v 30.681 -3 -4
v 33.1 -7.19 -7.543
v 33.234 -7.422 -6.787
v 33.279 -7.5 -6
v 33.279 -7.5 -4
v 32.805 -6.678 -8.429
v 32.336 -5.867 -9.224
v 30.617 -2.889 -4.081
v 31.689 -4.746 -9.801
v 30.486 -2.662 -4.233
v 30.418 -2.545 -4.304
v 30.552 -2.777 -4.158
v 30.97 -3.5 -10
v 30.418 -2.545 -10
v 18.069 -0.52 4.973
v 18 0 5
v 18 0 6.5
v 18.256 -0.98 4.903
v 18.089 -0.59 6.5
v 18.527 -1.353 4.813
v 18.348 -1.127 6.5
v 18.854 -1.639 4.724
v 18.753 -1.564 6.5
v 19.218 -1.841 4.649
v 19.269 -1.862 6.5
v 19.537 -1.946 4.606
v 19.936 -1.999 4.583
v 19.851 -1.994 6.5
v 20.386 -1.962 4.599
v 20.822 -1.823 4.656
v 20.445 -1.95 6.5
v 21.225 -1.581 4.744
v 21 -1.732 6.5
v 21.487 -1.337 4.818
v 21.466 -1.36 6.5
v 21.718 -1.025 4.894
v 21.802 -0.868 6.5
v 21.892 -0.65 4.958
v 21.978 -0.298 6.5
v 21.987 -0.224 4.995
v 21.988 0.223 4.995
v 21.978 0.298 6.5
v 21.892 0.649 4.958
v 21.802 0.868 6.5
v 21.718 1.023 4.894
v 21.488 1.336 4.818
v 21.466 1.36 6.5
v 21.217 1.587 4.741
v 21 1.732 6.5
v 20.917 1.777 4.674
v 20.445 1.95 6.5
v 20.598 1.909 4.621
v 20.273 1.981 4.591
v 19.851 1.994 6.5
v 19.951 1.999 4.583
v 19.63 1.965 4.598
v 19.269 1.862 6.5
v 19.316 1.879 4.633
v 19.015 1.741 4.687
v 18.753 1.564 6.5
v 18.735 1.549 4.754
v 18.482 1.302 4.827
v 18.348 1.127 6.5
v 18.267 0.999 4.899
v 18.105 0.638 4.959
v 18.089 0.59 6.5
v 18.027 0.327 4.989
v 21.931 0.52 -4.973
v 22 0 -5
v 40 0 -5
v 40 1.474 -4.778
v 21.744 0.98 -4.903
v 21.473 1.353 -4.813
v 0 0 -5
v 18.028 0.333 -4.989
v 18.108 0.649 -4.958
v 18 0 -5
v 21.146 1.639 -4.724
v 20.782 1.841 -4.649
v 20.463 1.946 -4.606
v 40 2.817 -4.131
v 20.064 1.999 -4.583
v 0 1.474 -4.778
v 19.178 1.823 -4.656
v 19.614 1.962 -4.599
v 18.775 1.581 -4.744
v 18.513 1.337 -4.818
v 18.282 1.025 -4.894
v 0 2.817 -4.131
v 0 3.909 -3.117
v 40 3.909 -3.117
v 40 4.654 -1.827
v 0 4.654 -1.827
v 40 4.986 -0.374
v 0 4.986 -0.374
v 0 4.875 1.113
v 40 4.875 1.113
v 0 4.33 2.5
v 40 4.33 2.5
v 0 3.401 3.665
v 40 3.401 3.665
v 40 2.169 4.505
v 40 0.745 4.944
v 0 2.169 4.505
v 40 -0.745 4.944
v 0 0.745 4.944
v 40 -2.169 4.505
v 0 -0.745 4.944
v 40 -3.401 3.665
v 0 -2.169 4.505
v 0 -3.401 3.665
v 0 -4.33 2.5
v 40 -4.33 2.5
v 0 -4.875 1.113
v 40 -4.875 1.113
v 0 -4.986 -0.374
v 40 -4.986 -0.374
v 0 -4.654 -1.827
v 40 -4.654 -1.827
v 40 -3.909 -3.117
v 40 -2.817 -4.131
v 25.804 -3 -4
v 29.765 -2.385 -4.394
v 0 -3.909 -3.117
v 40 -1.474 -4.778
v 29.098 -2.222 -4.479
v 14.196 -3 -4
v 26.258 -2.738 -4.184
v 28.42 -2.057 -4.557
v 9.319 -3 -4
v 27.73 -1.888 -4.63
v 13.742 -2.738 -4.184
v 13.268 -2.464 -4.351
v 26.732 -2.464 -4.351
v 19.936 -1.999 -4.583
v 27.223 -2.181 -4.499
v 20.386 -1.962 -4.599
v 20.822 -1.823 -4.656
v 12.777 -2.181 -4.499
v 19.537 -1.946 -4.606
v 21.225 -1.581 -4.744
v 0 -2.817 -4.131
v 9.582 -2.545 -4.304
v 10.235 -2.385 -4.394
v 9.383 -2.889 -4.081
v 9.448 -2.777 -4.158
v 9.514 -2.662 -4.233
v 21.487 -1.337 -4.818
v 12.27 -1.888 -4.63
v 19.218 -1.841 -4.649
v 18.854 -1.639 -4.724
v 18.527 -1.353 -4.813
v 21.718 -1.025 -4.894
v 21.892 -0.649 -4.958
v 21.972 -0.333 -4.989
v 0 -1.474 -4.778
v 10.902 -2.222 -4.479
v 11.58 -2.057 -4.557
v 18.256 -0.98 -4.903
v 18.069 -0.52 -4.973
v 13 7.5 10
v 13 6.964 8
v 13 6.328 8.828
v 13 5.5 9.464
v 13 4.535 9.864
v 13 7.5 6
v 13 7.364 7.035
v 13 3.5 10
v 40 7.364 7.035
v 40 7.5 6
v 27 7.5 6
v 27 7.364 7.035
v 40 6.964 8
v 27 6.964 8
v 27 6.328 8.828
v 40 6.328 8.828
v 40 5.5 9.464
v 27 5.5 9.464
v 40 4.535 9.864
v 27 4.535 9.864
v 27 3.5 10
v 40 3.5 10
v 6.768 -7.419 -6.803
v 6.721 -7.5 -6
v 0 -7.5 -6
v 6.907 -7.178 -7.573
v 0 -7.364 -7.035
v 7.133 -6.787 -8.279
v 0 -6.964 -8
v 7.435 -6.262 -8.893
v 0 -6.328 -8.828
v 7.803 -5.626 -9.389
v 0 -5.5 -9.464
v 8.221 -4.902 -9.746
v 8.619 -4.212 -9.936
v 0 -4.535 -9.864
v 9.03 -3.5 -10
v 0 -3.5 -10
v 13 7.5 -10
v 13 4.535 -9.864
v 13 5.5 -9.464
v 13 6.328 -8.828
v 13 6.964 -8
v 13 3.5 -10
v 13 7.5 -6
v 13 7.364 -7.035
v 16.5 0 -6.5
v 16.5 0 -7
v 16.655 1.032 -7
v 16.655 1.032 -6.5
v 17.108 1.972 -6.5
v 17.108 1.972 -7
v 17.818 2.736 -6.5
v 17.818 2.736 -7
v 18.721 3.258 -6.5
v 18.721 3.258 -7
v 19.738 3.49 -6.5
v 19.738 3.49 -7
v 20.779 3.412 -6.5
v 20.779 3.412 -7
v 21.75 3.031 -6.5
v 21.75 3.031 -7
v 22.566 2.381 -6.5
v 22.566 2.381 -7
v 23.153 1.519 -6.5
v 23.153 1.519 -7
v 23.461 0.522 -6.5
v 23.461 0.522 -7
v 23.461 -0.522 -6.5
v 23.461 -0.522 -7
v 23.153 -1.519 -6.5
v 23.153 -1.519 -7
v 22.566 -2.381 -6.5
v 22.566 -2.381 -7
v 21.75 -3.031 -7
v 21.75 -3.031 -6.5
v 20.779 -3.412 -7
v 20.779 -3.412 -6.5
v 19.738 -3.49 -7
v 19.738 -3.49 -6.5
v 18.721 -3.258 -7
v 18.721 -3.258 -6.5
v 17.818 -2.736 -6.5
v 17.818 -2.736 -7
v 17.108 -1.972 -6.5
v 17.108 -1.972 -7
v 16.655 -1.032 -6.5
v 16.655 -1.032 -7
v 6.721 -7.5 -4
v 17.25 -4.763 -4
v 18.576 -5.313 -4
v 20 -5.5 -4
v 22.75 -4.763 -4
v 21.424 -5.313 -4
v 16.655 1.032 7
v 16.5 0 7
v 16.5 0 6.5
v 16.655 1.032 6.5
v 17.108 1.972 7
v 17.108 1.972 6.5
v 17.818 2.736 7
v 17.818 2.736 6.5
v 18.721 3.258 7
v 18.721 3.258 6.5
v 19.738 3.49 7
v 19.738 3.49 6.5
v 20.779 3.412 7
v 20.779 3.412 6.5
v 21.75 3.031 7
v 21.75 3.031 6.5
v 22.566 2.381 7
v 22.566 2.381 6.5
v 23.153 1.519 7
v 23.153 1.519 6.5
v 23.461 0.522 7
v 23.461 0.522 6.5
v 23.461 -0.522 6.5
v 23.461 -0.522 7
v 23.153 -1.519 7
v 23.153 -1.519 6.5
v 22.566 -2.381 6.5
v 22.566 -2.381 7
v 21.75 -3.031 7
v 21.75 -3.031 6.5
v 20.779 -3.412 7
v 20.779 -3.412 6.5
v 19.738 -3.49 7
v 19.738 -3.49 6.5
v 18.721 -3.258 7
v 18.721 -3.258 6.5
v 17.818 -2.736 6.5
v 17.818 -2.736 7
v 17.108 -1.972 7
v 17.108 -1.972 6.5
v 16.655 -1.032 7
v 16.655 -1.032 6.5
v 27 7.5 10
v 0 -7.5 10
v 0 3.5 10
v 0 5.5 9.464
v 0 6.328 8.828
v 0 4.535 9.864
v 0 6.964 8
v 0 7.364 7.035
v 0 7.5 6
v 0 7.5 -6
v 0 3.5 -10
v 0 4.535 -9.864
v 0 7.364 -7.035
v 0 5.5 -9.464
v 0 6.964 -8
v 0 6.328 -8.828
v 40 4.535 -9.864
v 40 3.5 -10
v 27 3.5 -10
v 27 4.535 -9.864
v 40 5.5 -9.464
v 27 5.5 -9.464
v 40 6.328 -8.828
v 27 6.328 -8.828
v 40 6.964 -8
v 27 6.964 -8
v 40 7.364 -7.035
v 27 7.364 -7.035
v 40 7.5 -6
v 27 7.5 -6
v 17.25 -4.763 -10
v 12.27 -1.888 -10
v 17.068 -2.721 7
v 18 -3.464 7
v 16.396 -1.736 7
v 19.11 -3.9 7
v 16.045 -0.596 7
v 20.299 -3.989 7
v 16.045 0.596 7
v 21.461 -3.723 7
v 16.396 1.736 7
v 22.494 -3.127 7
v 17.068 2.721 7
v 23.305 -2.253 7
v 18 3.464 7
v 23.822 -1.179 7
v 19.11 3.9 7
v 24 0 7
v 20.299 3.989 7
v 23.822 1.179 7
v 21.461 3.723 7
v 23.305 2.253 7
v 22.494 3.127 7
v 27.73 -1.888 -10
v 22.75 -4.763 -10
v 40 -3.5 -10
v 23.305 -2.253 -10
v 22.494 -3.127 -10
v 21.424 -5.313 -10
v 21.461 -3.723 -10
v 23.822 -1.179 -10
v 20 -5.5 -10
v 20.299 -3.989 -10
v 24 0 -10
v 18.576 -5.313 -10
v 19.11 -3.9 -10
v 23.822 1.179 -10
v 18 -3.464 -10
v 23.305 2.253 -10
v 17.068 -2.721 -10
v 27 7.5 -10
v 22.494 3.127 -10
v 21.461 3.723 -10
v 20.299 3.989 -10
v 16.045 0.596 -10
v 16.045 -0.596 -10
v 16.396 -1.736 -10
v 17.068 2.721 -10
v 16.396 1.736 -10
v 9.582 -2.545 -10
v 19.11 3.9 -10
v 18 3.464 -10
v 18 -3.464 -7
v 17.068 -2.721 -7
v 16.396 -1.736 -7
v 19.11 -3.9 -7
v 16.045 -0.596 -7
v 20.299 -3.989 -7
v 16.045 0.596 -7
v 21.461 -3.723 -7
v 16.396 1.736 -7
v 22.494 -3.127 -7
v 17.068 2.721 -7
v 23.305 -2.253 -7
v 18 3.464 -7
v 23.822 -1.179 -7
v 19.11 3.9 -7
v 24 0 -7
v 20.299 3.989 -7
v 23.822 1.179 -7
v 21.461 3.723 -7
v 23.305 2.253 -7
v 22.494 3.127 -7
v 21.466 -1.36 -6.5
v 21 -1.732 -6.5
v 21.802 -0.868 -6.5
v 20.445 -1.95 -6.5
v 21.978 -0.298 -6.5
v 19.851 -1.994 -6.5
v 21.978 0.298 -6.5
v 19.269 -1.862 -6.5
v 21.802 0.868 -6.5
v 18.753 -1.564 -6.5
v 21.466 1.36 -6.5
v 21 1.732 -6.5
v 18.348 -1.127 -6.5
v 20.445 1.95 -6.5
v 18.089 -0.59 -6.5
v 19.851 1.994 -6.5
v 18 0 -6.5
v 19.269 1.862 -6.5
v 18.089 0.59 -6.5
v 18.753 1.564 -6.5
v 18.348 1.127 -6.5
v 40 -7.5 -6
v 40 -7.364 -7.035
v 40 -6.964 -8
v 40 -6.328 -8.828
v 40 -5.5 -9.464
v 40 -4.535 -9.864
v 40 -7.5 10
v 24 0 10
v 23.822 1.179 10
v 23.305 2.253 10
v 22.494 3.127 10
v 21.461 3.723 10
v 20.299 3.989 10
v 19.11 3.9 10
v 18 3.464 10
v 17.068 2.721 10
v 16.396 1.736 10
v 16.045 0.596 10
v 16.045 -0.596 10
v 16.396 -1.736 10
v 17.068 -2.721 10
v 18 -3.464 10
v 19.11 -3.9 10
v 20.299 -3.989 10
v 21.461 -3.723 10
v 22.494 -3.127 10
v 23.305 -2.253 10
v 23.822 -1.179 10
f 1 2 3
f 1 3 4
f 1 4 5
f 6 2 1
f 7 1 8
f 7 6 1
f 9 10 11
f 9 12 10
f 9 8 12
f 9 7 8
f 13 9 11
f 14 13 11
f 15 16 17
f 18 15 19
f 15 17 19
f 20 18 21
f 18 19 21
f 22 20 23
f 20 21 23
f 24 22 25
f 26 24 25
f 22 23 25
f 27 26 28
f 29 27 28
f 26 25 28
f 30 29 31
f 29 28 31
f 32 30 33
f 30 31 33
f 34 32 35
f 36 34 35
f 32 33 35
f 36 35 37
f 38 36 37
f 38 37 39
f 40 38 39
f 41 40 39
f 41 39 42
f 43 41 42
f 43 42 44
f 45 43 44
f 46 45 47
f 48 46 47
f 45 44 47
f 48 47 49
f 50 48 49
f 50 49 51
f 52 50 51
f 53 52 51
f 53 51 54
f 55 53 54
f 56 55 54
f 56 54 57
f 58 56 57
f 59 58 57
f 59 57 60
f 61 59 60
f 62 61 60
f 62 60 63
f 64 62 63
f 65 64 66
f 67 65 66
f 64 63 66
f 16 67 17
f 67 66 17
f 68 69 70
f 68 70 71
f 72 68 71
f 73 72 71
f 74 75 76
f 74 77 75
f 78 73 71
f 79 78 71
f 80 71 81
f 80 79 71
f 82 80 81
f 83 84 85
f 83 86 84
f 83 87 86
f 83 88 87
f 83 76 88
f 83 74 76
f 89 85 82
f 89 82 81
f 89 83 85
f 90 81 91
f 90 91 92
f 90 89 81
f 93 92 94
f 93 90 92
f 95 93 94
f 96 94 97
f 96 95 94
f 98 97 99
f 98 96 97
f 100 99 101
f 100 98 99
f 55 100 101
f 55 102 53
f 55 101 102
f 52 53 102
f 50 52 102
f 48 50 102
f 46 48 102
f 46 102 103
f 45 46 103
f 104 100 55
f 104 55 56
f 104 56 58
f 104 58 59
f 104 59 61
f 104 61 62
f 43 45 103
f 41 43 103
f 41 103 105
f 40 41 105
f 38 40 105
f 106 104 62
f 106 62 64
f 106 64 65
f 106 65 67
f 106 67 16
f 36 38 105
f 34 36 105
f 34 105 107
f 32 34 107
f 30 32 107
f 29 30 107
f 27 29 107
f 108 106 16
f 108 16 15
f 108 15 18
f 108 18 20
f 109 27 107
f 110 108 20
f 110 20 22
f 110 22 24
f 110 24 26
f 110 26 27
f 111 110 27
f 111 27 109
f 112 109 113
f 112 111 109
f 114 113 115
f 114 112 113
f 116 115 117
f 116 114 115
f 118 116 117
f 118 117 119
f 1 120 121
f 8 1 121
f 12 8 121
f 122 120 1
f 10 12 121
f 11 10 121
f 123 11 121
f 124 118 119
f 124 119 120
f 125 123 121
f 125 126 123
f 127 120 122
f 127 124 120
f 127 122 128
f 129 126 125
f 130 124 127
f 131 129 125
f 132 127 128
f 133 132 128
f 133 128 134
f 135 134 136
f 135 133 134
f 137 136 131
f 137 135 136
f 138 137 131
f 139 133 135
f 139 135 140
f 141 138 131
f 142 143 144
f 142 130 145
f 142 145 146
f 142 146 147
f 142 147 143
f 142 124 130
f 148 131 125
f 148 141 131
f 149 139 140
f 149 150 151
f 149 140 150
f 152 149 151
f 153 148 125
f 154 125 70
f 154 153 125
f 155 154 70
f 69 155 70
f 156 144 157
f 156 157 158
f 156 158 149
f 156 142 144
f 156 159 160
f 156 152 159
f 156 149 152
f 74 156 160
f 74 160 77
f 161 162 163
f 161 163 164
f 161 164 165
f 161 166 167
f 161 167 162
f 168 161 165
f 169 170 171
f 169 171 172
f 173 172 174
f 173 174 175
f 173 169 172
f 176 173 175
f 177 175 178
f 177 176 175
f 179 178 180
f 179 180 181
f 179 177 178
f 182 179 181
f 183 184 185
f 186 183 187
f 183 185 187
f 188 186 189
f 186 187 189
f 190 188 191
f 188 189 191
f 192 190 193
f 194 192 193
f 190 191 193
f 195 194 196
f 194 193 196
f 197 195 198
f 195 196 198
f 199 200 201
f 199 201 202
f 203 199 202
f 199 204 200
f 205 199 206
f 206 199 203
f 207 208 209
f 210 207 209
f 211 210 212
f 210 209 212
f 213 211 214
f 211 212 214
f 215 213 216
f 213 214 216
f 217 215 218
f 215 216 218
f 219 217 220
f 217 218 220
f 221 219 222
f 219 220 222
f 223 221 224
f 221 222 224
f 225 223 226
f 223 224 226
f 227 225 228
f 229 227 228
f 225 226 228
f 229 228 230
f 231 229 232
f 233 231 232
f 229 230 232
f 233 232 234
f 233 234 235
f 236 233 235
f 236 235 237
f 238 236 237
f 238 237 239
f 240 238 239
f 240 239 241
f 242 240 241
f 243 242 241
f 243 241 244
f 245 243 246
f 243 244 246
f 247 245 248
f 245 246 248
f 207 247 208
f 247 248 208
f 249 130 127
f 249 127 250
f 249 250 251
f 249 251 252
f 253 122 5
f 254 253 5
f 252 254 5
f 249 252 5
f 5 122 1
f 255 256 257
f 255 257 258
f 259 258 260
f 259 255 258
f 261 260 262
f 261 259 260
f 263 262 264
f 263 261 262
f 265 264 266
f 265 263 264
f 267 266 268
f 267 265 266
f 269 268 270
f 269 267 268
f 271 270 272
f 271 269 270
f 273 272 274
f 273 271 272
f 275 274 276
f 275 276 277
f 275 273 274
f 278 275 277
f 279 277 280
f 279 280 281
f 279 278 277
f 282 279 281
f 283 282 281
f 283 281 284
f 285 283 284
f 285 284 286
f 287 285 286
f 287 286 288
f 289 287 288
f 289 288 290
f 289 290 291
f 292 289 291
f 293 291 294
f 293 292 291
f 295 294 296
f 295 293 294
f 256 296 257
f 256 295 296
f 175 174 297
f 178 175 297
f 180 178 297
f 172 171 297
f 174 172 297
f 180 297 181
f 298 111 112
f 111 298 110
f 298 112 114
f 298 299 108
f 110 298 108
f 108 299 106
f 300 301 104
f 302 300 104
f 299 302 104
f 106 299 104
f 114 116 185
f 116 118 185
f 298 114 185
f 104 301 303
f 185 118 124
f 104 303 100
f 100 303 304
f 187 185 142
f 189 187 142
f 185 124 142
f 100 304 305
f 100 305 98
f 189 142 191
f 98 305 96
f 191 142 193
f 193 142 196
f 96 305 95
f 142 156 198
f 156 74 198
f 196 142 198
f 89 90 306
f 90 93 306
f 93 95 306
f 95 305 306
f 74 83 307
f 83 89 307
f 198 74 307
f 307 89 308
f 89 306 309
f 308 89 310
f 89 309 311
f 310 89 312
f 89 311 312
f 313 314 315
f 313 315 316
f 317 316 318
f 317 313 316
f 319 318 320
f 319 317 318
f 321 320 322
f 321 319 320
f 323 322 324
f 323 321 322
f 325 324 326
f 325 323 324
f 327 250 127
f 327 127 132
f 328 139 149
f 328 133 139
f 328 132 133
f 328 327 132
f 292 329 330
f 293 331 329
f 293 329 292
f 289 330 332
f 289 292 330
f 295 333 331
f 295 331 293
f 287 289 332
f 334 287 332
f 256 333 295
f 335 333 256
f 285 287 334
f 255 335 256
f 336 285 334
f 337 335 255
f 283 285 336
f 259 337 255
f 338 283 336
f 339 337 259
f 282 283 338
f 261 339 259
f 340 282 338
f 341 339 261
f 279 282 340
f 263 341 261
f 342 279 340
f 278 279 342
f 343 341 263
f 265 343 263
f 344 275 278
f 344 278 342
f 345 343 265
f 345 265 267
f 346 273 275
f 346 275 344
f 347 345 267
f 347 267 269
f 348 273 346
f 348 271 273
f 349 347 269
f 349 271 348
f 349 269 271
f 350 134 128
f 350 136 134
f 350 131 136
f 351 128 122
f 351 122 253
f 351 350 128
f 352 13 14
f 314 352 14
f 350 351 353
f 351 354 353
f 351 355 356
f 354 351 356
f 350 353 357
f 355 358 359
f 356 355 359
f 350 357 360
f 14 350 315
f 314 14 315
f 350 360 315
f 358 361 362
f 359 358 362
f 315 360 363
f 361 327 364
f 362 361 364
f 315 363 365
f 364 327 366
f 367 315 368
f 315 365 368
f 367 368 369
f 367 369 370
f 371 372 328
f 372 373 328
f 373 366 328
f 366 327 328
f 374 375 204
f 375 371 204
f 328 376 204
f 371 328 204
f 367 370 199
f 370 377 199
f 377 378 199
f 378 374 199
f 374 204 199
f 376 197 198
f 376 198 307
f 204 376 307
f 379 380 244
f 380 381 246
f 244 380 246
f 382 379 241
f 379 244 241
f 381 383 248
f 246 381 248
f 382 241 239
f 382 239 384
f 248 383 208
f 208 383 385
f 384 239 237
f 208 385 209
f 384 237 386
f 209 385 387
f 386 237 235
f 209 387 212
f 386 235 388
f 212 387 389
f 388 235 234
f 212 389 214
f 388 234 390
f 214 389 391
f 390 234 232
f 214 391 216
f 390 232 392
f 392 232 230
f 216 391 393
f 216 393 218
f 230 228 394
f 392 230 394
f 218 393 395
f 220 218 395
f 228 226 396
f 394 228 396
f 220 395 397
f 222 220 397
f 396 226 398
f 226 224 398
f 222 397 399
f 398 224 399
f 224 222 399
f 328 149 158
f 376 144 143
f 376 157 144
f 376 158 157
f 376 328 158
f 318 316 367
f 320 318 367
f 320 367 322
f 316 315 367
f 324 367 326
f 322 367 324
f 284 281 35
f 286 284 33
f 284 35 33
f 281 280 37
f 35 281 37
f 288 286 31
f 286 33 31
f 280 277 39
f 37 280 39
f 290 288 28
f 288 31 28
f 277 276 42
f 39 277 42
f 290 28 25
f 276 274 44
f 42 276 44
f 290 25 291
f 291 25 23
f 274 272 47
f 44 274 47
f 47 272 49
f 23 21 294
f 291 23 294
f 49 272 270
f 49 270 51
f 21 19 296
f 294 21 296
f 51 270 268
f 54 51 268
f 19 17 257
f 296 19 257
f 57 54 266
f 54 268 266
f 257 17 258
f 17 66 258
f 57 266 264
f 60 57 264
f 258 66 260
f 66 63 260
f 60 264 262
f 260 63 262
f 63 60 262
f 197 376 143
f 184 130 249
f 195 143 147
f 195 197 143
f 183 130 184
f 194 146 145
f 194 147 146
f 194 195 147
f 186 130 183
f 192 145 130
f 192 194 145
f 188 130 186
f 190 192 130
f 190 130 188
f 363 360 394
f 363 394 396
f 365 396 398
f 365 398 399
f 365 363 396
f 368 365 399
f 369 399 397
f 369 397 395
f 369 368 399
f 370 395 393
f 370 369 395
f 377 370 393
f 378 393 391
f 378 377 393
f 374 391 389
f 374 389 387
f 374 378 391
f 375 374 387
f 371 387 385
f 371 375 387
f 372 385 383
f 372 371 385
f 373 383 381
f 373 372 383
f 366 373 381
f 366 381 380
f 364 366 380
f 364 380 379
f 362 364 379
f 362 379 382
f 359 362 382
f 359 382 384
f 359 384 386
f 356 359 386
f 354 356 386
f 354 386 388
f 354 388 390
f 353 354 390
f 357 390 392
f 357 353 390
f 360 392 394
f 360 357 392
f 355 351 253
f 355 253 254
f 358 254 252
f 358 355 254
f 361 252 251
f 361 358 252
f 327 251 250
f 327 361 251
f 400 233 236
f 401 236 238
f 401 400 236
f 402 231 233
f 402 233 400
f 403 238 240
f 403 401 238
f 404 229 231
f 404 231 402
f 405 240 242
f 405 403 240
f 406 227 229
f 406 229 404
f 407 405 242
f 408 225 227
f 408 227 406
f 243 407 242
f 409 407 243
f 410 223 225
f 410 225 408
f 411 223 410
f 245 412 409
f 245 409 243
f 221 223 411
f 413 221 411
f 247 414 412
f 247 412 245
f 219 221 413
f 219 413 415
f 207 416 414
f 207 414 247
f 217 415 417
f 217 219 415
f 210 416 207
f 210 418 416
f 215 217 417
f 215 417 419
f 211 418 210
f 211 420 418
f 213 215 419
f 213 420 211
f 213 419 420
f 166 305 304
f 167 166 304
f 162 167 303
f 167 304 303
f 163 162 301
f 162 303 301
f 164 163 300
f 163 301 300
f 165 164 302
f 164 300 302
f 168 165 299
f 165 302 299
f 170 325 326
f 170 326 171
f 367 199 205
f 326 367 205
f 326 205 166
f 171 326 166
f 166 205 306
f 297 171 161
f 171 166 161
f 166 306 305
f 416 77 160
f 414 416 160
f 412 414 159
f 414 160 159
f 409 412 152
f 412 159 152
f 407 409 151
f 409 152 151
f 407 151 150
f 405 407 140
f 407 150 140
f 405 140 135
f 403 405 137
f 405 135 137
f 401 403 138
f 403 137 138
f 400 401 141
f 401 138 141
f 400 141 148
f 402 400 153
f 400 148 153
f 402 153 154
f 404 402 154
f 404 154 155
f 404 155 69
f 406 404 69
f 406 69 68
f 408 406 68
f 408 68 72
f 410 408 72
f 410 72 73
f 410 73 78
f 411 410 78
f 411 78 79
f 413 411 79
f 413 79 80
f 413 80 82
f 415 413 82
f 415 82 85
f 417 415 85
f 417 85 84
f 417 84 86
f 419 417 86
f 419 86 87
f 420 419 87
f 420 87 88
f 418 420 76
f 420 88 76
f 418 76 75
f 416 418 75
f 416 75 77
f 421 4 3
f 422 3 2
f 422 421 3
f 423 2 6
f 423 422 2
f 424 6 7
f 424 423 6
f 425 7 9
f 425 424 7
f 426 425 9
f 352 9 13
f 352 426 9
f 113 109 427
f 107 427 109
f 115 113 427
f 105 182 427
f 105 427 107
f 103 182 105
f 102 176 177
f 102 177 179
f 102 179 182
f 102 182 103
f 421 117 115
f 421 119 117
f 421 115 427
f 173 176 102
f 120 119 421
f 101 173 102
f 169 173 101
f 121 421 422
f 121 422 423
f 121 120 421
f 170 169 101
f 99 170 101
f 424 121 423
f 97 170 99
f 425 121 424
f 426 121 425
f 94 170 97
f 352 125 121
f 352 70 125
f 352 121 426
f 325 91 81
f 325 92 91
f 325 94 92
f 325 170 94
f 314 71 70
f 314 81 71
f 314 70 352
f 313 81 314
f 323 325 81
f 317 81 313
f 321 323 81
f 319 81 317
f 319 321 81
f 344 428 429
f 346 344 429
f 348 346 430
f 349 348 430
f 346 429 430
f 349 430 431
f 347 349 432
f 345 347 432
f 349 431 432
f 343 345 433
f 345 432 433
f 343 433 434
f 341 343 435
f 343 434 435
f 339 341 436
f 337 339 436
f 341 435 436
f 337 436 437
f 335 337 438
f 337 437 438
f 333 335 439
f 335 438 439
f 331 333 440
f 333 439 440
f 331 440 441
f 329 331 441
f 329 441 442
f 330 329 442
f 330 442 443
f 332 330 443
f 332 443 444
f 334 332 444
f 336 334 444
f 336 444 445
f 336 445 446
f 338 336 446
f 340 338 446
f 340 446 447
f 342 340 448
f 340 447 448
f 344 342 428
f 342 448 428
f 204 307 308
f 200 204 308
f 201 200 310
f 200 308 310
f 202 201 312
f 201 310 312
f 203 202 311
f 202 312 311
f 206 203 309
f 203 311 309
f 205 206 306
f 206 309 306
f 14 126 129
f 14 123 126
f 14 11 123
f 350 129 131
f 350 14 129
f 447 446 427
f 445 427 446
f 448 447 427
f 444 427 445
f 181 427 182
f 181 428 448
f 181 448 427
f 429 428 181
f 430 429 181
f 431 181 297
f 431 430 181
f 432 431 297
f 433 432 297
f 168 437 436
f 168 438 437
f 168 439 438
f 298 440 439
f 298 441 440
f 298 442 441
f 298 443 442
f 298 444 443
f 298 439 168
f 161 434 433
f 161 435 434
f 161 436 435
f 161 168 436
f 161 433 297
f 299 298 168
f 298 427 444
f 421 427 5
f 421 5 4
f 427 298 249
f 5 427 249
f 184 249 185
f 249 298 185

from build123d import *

# Parameters (mm, degrees)
SKETCH_1_W          = 20
SKETCH_1_H          = 15
SKETCH_1_R          = 5
EXTRUDE_1_DEPTH     = 40
SKETCH_2_R          = 4
CUT_EXTRUDE_1_DEPTH = 3
SKETCH_3_R          = 2
CUT_EXTRUDE_2_DEPTH = 45.10498838
SKETCH_4_W          = 26.593745906
SKETCH_4_H          = 18.404579196
CUT_EXTRUDE_3_DEPTH = 13
SKETCH_5_R          = 3.5
CUT_EXTRUDE_4_DEPTH = 0.5
CUT_EXTRUDE_5_DEPTH = 6


with BuildPart() as part:
    # 草圖1 → 填料-伸長1 (new body)
    with BuildSketch(Plane(origin=(0, 0, 0), x_dir=(0, 0, -1), z_dir=(1, 0, 0))):
        Rectangle(SKETCH_1_W, SKETCH_1_H)
        Circle(SKETCH_1_R, mode=Mode.SUBTRACT)
    extrude(amount=EXTRUDE_1_DEPTH)

    # 草圖2 → 除料-伸長1 (cut)
    with BuildSketch(Plane.XY.offset(10)):
        with Locations((20, 0)):
            Circle(SKETCH_2_R)
    cut_extrude_1 = extrude(amount=-CUT_EXTRUDE_1_DEPTH, mode=Mode.SUBTRACT)

    # 鏡射1: 除料-伸長1 across plane
    add(cut_extrude_1.mirror(Plane.XY), mode=Mode.SUBTRACT)

    # 草圖3 → 除料-伸長2 (cut, through all)
    with BuildSketch(Plane.XY.offset(7)):
        with Locations(Location((20, 0, 0), (0, 0, 179.999999998))):
            Circle(SKETCH_3_R)
    extrude(amount=-CUT_EXTRUDE_2_DEPTH, mode=Mode.SUBTRACT)

    # 草圖4 → 除料-伸長3 (cut)
    with BuildSketch(Plane.ZY):
        Rectangle(SKETCH_4_W, SKETCH_4_H)
        with BuildLine():
            Line((-6, 7.5), (6, 7.5))
            ThreePointArc((6, 7.5), (8.828427125, 6.328427125), (10, 3.5))
            Line((10, 3.5), (10, -7.5))
            Line((10, -7.5), (-6, -7.5))
            ThreePointArc((-6, -7.5), (-8.828427125, -6.328427125), (-10, -3.5))
            Line((-10, -3.5), (-10, 3.5))
            ThreePointArc((-10, 3.5), (-8.828427125, 6.328427125), (-6, 7.5))
        make_face(mode=Mode.SUBTRACT)
    cut_extrude_3 = extrude(amount=-CUT_EXTRUDE_3_DEPTH, mode=Mode.SUBTRACT)

    # 鏡射2: 除料-伸長3 across plane
    add(cut_extrude_3.mirror(Plane(origin=(20, 0, 0), x_dir=(0, 0, 1), z_dir=(1, 0, 0))), mode=Mode.SUBTRACT)

    # 草圖5 → 除料-伸長4 (cut)
    with BuildSketch(Plane(origin=(0, 0, -7), x_dir=(-1, 0, 0), z_dir=(0, 0, -1))):
        with Locations((-20, 0)):
            Circle(SKETCH_5_R)
    cut_extrude_4 = extrude(amount=-CUT_EXTRUDE_4_DEPTH, mode=Mode.SUBTRACT)

    # 鏡射3: 除料-伸長4 across plane
    add(cut_extrude_4.mirror(Plane.XY), mode=Mode.SUBTRACT)

    # 草圖6 → 除料-伸長5 (cut)
    with BuildSketch(Plane.XY.offset(-10)):
        with BuildLine():
            Line((15.669872981, -7.5), (24.330127019, -7.5))
            Line((24.330127019, -7.5), (33.279056191, -7.5))
            Line((33.279056191, -7.5), (30.418218618, -2.544883972))
            Line((30.418218618, -2.544883972), (27.729646072, -1.888139721))
            Line((27.729646072, -1.888139721), (22.75, -4.763139721))
            ThreePointArc((22.75, -4.763139721), (20, -5.5), (17.25, -4.763139721))
            Line((17.25, -4.763139721), (12.270353928, -1.888139721))
            Line((12.270353928, -1.888139721), (9.581781382, -2.544883972))
            Line((9.581781382, -2.544883972), (6.720943809, -7.5))
            Line((6.720943809, -7.5), (15.669872981, -7.5))
        make_face()
    extrude(amount=CUT_EXTRUDE_5_DEPTH, mode=Mode.SUBTRACT)


solid = part.part
